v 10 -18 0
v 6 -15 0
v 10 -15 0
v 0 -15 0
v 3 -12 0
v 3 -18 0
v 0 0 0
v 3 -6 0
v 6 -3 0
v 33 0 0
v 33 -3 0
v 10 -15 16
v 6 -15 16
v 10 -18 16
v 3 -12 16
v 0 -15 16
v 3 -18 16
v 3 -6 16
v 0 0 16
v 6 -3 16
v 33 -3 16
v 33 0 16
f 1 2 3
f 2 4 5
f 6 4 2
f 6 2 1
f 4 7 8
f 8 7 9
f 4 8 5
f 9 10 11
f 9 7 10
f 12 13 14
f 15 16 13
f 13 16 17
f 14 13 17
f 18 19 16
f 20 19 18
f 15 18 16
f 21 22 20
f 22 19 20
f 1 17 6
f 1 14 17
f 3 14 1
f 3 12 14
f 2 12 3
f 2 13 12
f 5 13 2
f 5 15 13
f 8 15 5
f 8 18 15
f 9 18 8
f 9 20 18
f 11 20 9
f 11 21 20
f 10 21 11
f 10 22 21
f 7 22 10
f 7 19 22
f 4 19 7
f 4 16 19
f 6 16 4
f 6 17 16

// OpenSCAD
// Customizable Wall Bracket
// (c) 2013 Wouter Robers
// remixed 2015 by Fritz Toch

// variable description

// How thick is the thing you want to bracket, in mm?
ClampSize=12;

// Material thickness (thicker makes stronger, but less flexible) in mm?
Thickness=3;

// Height of the rim in the front of the bracket, in mm?
RimHeight=7; 

// Corner bevel size (bigger bevel gives better strength) in mm?
Corner=3;

// Width of bracket, in mm?
BracketWidth=16;

// Height of bracket 'tail'-the part against the wall, in mm?
TailHeight=30;


MakeBracket();

module MakeBracket(){
rotate([0,0,-90]) difference(){
linear_extrude(height = BracketWidth)
polygon([[0,0],[0,TailHeight+Thickness],[Thickness,TailHeight+Thickness],[Thickness,Thickness+Corner],[Thickness+Corner,Thickness],[Thickness+ClampSize-Corner,Thickness],[Thickness+ClampSize,Thickness+Corner],[Thickness+ClampSize,Thickness+RimHeight],[2*Thickness+ClampSize,Thickness+RimHeight],[2*Thickness+ClampSize,Corner],[2*Thickness+ClampSize-Corner,0]]);

}
}
